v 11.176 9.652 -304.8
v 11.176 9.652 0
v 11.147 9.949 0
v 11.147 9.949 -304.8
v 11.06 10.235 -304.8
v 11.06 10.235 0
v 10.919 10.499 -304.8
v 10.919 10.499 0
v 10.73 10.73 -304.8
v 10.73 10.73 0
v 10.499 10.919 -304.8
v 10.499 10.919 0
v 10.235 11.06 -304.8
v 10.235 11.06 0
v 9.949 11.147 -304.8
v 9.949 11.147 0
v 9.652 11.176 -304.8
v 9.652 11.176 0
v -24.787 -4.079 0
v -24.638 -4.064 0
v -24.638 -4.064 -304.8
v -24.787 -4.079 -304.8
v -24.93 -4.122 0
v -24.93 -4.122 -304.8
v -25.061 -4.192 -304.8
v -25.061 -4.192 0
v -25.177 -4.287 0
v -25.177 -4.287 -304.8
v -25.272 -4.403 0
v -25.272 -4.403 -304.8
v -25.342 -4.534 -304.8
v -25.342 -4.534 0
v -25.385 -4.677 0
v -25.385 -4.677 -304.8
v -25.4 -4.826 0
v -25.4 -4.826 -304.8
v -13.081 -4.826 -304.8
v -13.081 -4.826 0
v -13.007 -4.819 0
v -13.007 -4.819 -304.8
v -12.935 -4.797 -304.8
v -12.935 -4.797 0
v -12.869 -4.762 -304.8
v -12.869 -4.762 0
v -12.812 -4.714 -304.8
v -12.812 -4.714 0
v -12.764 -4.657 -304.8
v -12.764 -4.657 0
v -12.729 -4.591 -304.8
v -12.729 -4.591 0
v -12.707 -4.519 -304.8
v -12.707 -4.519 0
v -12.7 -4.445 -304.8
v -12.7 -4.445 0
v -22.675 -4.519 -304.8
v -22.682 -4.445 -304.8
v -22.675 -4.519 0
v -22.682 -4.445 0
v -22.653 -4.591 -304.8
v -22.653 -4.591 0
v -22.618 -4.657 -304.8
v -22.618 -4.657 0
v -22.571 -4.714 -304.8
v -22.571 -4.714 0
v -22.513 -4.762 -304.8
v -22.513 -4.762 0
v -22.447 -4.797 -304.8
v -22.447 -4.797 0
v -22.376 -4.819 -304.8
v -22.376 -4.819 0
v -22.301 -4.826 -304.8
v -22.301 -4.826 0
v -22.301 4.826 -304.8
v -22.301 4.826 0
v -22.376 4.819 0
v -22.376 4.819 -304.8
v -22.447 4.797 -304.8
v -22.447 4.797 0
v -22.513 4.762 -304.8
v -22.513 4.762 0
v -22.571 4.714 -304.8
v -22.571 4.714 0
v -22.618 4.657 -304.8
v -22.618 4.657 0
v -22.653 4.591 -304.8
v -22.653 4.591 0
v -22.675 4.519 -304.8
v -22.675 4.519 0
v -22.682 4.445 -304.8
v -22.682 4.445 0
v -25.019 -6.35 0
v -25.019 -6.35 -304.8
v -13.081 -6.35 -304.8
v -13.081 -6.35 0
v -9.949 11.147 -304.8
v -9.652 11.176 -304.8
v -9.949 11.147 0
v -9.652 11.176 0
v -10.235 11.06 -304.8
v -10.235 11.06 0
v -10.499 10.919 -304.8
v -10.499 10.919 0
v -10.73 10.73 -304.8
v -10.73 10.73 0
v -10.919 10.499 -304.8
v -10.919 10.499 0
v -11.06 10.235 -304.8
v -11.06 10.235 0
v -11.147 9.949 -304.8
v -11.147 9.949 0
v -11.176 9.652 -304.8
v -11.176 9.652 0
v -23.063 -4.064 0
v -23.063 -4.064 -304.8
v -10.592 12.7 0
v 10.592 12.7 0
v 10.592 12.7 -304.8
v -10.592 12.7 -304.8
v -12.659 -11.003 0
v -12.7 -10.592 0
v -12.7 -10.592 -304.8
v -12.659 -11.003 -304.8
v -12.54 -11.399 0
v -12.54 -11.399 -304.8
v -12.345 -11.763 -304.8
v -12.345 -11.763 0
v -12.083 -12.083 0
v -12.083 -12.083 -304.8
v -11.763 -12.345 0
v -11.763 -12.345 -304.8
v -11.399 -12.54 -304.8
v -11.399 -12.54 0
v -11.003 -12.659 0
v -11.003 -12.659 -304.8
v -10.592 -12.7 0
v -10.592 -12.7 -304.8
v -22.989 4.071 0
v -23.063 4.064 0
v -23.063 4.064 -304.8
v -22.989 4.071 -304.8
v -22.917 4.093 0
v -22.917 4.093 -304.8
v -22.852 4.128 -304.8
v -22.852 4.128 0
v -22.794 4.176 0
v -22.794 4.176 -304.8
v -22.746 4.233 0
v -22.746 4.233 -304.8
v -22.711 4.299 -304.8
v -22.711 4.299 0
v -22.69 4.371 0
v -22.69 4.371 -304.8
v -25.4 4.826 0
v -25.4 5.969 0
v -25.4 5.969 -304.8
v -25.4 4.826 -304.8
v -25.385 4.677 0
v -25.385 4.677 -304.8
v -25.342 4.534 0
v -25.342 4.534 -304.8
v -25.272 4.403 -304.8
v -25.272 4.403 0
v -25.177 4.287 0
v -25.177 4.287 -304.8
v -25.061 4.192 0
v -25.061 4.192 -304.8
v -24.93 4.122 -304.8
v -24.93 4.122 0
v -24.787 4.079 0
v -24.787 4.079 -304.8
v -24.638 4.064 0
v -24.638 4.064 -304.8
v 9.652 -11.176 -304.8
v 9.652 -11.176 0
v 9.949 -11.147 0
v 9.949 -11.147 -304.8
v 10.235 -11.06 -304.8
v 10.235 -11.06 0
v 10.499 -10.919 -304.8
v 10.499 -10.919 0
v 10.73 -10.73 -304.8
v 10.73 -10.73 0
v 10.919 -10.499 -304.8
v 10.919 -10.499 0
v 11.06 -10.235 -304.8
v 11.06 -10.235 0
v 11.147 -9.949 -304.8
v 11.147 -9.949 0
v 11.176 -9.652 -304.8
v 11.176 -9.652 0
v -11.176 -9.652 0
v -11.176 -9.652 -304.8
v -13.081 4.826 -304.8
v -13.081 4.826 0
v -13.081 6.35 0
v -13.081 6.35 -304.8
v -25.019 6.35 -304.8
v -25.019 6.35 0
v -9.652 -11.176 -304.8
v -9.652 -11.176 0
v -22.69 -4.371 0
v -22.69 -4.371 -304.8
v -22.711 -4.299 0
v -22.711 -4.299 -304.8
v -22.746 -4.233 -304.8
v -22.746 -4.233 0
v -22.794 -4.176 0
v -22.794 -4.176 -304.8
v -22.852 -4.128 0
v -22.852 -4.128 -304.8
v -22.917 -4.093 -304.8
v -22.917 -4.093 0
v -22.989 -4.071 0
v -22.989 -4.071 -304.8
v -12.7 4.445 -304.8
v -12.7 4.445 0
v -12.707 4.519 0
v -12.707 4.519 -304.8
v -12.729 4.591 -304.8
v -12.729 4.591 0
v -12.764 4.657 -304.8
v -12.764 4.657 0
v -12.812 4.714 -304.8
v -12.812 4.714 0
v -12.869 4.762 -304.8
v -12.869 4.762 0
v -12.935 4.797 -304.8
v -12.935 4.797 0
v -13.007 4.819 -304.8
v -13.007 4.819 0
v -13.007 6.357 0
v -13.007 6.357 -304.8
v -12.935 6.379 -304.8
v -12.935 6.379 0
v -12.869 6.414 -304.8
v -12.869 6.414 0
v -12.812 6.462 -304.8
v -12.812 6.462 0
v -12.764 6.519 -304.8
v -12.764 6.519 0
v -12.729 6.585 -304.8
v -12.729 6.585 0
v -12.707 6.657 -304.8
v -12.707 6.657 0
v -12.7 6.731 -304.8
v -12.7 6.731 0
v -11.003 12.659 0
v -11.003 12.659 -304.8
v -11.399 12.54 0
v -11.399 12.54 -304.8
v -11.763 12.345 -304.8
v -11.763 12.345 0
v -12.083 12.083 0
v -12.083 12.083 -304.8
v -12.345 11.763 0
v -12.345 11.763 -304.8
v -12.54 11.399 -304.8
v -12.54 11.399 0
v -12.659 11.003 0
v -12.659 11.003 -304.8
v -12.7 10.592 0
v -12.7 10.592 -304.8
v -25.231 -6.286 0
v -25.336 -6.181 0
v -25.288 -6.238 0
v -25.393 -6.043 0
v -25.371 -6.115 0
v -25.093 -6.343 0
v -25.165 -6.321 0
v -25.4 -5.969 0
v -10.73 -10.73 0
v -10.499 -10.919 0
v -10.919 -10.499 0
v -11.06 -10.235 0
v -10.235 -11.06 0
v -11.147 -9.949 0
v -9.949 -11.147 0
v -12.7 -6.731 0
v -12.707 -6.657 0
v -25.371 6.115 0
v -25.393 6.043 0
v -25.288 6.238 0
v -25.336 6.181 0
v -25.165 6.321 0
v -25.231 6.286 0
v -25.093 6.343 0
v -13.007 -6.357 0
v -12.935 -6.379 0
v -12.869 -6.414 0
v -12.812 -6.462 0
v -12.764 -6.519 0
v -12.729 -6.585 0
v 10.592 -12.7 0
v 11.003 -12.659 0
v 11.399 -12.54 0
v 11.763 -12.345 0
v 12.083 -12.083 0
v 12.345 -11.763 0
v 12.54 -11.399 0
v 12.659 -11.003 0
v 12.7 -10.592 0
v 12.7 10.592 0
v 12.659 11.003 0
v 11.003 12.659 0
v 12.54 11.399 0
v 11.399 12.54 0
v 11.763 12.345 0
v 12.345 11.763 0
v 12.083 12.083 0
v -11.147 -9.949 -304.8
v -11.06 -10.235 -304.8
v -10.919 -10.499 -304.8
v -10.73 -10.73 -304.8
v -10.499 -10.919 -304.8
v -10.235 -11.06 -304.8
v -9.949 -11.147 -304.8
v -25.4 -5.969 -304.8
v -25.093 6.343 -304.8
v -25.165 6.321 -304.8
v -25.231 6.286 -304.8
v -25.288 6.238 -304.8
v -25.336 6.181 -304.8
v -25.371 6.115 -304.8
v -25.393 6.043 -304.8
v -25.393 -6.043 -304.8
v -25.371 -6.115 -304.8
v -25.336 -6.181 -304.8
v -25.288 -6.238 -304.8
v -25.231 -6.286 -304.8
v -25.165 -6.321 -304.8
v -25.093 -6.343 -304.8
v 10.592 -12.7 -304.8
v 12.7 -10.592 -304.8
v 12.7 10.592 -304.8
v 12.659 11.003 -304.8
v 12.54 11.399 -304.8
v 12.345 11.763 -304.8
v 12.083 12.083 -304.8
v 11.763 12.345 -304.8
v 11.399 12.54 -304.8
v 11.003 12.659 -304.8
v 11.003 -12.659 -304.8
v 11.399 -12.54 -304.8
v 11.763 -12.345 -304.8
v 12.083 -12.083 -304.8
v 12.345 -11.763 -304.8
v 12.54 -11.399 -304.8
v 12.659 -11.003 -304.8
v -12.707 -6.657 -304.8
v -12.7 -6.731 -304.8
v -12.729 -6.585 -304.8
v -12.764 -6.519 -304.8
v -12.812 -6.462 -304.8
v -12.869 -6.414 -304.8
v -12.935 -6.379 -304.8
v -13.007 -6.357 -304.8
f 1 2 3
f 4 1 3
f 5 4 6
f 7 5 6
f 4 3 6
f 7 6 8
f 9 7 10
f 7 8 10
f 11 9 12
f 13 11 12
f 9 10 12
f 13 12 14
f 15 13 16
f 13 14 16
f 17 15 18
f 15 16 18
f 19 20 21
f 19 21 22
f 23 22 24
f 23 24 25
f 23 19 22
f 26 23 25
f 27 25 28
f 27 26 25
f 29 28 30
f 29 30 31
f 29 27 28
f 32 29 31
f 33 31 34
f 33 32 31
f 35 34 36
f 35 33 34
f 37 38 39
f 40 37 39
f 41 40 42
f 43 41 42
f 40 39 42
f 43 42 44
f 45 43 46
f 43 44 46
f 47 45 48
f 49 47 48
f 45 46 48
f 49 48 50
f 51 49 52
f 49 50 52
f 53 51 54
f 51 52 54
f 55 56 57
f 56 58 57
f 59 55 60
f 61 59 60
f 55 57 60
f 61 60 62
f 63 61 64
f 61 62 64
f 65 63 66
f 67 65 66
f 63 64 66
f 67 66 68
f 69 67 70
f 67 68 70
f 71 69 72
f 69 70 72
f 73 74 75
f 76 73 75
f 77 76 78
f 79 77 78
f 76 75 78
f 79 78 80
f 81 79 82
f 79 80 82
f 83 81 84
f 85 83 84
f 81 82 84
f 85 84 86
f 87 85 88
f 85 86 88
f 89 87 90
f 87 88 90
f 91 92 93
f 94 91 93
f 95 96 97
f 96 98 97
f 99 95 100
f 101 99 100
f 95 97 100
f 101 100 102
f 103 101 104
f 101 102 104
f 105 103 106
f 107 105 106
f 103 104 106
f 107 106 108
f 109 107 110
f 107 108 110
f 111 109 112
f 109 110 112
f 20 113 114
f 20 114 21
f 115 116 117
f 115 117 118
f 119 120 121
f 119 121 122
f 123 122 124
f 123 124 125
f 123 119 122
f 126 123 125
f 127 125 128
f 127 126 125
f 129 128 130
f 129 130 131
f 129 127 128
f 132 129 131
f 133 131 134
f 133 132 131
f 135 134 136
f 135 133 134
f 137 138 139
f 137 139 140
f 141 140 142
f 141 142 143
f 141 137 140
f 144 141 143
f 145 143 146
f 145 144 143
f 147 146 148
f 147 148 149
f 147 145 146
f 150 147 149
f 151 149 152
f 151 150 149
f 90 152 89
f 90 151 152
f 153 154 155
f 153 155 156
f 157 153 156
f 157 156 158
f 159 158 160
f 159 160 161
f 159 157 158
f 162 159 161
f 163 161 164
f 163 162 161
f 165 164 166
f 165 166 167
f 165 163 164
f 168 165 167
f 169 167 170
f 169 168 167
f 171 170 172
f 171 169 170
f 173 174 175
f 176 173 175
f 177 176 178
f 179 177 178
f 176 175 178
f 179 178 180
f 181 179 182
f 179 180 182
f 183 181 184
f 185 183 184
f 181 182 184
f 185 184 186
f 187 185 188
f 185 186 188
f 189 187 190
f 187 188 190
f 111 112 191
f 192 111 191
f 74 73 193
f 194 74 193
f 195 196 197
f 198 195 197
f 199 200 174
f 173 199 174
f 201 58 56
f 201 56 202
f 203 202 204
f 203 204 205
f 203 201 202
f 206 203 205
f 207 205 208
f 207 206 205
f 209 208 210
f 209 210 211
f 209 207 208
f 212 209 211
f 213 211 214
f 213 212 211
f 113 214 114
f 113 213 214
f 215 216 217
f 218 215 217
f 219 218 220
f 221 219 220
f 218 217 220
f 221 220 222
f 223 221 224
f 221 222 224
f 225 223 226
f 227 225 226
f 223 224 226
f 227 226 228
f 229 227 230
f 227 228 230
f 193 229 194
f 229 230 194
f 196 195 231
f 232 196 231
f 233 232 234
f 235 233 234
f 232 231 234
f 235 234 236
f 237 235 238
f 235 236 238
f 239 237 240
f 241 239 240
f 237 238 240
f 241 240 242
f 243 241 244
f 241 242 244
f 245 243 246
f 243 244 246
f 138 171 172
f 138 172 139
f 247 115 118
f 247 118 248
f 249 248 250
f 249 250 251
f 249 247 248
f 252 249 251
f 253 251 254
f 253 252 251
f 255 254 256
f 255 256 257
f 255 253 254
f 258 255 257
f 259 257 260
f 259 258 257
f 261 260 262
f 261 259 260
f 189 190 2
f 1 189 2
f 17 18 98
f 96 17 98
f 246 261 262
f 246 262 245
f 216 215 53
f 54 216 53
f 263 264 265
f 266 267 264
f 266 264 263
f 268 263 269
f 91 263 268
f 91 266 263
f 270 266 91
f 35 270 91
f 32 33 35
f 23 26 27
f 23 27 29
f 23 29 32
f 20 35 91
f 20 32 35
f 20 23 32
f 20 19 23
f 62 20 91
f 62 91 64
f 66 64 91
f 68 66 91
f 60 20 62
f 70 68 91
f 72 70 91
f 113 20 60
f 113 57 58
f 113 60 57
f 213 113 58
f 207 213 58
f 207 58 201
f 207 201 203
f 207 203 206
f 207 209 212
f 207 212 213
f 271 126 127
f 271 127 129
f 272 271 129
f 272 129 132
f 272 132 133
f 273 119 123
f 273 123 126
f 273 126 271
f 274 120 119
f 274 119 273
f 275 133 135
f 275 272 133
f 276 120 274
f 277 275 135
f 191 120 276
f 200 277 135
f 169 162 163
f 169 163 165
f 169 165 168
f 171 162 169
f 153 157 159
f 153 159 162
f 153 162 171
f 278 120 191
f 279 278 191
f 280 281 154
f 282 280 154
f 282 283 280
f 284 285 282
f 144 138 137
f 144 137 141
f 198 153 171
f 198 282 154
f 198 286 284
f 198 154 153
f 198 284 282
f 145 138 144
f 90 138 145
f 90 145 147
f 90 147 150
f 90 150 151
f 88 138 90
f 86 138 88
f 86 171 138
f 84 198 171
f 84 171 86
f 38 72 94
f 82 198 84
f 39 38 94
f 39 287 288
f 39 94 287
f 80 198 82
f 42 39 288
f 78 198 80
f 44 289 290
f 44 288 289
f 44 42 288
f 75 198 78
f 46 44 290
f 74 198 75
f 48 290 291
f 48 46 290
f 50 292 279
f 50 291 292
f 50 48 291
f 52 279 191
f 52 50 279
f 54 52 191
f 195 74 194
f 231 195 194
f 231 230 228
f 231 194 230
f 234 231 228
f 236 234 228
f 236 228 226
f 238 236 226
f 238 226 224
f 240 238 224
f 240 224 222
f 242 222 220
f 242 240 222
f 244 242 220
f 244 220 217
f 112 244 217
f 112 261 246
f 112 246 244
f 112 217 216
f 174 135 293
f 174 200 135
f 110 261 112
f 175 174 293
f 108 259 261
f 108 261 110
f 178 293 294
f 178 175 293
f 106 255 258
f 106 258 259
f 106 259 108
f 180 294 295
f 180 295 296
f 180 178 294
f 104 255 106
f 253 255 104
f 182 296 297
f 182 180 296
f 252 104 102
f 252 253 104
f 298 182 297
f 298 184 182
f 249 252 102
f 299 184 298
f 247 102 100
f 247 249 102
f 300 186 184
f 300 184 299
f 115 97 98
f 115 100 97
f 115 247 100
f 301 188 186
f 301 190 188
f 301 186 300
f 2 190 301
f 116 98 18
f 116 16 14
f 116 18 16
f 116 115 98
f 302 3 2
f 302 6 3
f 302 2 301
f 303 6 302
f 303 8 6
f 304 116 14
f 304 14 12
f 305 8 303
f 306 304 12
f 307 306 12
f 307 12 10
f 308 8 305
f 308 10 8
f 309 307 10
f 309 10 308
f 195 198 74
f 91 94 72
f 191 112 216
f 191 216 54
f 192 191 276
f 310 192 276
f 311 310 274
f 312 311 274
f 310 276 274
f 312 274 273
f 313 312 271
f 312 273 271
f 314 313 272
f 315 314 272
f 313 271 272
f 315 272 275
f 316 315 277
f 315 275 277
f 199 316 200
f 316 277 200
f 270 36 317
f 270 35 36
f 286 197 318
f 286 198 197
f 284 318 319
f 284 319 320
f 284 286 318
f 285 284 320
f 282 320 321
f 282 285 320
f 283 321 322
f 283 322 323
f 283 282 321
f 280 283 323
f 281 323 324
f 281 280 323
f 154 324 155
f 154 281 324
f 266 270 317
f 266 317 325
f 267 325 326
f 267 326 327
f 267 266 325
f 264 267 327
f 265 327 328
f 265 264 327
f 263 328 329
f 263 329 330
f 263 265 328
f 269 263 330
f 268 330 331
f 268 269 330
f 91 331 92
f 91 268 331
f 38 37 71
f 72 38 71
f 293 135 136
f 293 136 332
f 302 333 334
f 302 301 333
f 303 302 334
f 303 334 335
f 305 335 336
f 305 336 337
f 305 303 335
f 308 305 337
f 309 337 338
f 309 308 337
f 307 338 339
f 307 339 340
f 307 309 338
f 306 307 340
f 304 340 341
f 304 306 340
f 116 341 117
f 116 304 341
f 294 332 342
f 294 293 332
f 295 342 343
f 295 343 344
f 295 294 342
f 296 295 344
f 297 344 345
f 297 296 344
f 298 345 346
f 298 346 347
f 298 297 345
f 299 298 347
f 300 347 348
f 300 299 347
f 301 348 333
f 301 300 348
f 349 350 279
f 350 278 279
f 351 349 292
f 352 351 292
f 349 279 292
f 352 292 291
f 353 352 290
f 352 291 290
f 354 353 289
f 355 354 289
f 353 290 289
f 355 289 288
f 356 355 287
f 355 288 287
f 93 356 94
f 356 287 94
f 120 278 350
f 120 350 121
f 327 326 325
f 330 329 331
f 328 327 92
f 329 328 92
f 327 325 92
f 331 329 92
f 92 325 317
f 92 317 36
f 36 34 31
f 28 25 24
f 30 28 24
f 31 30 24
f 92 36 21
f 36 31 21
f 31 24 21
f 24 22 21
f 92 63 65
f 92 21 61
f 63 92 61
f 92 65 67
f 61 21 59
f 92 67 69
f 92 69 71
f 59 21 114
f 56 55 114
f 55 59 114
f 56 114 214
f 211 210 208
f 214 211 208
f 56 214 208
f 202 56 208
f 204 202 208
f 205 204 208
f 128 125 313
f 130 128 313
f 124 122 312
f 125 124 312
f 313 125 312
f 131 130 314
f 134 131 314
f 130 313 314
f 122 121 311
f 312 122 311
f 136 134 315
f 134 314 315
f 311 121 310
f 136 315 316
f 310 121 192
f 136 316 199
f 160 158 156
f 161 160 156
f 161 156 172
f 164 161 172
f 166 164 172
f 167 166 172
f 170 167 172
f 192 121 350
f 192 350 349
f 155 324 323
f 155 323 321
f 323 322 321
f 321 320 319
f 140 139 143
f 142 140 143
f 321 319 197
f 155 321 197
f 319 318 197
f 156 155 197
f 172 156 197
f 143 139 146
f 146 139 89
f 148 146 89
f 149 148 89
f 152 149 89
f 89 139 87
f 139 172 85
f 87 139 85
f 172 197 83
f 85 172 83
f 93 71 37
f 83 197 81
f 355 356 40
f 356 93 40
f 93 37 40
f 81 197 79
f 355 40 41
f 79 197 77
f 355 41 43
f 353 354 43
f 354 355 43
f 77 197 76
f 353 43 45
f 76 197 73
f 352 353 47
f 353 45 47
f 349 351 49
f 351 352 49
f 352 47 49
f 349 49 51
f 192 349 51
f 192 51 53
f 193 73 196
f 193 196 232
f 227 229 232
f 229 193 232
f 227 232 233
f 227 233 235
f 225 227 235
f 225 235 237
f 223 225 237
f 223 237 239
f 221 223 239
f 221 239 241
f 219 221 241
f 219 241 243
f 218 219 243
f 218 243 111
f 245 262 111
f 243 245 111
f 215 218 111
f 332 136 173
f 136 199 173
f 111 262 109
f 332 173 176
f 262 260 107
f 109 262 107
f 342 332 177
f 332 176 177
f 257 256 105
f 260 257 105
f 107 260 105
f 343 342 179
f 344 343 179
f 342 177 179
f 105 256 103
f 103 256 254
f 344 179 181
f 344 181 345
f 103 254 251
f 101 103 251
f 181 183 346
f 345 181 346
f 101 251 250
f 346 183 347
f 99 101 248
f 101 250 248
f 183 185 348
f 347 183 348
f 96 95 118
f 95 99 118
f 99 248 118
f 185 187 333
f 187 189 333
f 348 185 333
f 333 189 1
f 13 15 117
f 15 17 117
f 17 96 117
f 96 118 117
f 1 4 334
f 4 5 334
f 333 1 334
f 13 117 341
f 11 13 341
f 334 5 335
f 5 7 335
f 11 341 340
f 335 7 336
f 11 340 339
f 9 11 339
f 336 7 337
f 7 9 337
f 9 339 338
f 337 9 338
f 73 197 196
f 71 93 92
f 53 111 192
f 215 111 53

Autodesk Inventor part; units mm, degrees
ref_plane "YZ Plane" through (0, 0, 0) normal (1, 0, 0) x (0, 1, 0)
ref_plane "XZ Plane" through (0, 0, 0) normal (0, 1, 0) x (-1, 0, 0)
ref_plane "XY Plane" through (0, 0, 0) normal (0, 0, 1) x (1, 0, 0)
sketch "Sketch1" plane through (0, 0, 0) normal (0, 0, 1) x (1, 0, 0)
  arc A0 (-11.176, -9.652) -> (-9.652, -11.176) centre (-9.652, -9.652) ccw
  line L0 (-11.176, 9.652) -> (-11.176, -9.652)
  arc A1 (-9.652, 11.176) -> (-11.176, 9.652) centre (-9.652, 9.652) ccw
  line L1 (9.652, 11.176) -> (-9.652, 11.176)
  arc A2 (11.176, 9.652) -> (9.652, 11.176) centre (9.652, 9.652) ccw
  line L2 (11.176, -9.652) -> (11.176, 9.652)
  arc A3 (9.652, -11.176) -> (11.176, -9.652) centre (9.652, -9.652) ccw
  line L3 (-9.652, -11.176) -> (9.652, -11.176)
  arc A4 (12.7, 10.5918) -> (10.5918, 12.7) centre (10.5918, 10.5918) ccw
  line L4 (10.5918, 12.7) -> (-10.5918, 12.7)
  arc A5 (-10.5918, 12.7) -> (-12.7, 10.5918) centre (-10.5918, 10.5918) ccw
  line L5 (-12.7, 10.5918) -> (-12.7, 6.731)
  arc A6 (-13.081, 6.35) -> (-12.7, 6.731) centre (-13.081, 6.731) ccw
  line L6 (-13.081, 6.35) -> (-25.019, 6.35)
  arc A7 (-25.019, 6.35) -> (-25.4, 5.969) centre (-25.019, 5.969) ccw
  line L7 (-25.4, 5.969) -> (-25.4, 4.826)
  arc A8 (-25.4, 4.826) -> (-24.638, 4.064) centre (-24.638, 4.826) ccw
  line L8 (-24.638, 4.064) -> (-23.0632, 4.064)
  arc A9 (-23.0632, 4.064) -> (-22.6822, 4.445) centre (-23.0632, 4.445) ccw
  arc A10 (-22.3012, 4.826) -> (-22.6822, 4.445) centre (-22.3012, 4.445) ccw
  line L9 (-22.3012, 4.826) -> (-13.081, 4.826)
  arc A11 (-12.7, 4.445) -> (-13.081, 4.826) centre (-13.081, 4.445) ccw
  line L10 (-12.7, 4.445) -> (-12.7, -4.445)
  arc A12 (-13.081, -4.826) -> (-12.7, -4.445) centre (-13.081, -4.445) ccw
  line L11 (-13.081, -4.826) -> (-22.3012, -4.826)
  arc A13 (-22.6822, -4.445) -> (-22.3012, -4.826) centre (-22.3012, -4.445) ccw
  arc A14 (-22.6822, -4.445) -> (-23.0632, -4.064) centre (-23.0632, -4.445) ccw
  line L12 (-23.0632, -4.064) -> (-24.638, -4.064)
  arc A15 (-24.638, -4.064) -> (-25.4, -4.826) centre (-24.638, -4.826) ccw
  line L13 (-25.4, -4.826) -> (-25.4, -5.969)
  arc A16 (-25.4, -5.969) -> (-25.019, -6.35) centre (-25.019, -5.969) ccw
  line L14 (-25.019, -6.35) -> (-13.081, -6.35)
  arc A17 (-12.7, -6.731) -> (-13.081, -6.35) centre (-13.081, -6.731) ccw
  line L15 (-12.7, -6.731) -> (-12.7, -10.5918)
  arc A18 (-12.7, -10.5918) -> (-10.5918, -12.7) centre (-10.5918, -10.5918) ccw
  line L16 (-10.5918, -12.7) -> (10.5918, -12.7)
  arc A19 (10.5918, -12.7) -> (12.7, -10.5918) centre (10.5918, -10.5918) ccw
  line L17 (12.7, -10.5918) -> (12.7, 10.5918)
  point P0 (0, 0)
extrude "Extrusion1" add sketch "Sketch1" against normal blind 304.8
properties part number "9025"
